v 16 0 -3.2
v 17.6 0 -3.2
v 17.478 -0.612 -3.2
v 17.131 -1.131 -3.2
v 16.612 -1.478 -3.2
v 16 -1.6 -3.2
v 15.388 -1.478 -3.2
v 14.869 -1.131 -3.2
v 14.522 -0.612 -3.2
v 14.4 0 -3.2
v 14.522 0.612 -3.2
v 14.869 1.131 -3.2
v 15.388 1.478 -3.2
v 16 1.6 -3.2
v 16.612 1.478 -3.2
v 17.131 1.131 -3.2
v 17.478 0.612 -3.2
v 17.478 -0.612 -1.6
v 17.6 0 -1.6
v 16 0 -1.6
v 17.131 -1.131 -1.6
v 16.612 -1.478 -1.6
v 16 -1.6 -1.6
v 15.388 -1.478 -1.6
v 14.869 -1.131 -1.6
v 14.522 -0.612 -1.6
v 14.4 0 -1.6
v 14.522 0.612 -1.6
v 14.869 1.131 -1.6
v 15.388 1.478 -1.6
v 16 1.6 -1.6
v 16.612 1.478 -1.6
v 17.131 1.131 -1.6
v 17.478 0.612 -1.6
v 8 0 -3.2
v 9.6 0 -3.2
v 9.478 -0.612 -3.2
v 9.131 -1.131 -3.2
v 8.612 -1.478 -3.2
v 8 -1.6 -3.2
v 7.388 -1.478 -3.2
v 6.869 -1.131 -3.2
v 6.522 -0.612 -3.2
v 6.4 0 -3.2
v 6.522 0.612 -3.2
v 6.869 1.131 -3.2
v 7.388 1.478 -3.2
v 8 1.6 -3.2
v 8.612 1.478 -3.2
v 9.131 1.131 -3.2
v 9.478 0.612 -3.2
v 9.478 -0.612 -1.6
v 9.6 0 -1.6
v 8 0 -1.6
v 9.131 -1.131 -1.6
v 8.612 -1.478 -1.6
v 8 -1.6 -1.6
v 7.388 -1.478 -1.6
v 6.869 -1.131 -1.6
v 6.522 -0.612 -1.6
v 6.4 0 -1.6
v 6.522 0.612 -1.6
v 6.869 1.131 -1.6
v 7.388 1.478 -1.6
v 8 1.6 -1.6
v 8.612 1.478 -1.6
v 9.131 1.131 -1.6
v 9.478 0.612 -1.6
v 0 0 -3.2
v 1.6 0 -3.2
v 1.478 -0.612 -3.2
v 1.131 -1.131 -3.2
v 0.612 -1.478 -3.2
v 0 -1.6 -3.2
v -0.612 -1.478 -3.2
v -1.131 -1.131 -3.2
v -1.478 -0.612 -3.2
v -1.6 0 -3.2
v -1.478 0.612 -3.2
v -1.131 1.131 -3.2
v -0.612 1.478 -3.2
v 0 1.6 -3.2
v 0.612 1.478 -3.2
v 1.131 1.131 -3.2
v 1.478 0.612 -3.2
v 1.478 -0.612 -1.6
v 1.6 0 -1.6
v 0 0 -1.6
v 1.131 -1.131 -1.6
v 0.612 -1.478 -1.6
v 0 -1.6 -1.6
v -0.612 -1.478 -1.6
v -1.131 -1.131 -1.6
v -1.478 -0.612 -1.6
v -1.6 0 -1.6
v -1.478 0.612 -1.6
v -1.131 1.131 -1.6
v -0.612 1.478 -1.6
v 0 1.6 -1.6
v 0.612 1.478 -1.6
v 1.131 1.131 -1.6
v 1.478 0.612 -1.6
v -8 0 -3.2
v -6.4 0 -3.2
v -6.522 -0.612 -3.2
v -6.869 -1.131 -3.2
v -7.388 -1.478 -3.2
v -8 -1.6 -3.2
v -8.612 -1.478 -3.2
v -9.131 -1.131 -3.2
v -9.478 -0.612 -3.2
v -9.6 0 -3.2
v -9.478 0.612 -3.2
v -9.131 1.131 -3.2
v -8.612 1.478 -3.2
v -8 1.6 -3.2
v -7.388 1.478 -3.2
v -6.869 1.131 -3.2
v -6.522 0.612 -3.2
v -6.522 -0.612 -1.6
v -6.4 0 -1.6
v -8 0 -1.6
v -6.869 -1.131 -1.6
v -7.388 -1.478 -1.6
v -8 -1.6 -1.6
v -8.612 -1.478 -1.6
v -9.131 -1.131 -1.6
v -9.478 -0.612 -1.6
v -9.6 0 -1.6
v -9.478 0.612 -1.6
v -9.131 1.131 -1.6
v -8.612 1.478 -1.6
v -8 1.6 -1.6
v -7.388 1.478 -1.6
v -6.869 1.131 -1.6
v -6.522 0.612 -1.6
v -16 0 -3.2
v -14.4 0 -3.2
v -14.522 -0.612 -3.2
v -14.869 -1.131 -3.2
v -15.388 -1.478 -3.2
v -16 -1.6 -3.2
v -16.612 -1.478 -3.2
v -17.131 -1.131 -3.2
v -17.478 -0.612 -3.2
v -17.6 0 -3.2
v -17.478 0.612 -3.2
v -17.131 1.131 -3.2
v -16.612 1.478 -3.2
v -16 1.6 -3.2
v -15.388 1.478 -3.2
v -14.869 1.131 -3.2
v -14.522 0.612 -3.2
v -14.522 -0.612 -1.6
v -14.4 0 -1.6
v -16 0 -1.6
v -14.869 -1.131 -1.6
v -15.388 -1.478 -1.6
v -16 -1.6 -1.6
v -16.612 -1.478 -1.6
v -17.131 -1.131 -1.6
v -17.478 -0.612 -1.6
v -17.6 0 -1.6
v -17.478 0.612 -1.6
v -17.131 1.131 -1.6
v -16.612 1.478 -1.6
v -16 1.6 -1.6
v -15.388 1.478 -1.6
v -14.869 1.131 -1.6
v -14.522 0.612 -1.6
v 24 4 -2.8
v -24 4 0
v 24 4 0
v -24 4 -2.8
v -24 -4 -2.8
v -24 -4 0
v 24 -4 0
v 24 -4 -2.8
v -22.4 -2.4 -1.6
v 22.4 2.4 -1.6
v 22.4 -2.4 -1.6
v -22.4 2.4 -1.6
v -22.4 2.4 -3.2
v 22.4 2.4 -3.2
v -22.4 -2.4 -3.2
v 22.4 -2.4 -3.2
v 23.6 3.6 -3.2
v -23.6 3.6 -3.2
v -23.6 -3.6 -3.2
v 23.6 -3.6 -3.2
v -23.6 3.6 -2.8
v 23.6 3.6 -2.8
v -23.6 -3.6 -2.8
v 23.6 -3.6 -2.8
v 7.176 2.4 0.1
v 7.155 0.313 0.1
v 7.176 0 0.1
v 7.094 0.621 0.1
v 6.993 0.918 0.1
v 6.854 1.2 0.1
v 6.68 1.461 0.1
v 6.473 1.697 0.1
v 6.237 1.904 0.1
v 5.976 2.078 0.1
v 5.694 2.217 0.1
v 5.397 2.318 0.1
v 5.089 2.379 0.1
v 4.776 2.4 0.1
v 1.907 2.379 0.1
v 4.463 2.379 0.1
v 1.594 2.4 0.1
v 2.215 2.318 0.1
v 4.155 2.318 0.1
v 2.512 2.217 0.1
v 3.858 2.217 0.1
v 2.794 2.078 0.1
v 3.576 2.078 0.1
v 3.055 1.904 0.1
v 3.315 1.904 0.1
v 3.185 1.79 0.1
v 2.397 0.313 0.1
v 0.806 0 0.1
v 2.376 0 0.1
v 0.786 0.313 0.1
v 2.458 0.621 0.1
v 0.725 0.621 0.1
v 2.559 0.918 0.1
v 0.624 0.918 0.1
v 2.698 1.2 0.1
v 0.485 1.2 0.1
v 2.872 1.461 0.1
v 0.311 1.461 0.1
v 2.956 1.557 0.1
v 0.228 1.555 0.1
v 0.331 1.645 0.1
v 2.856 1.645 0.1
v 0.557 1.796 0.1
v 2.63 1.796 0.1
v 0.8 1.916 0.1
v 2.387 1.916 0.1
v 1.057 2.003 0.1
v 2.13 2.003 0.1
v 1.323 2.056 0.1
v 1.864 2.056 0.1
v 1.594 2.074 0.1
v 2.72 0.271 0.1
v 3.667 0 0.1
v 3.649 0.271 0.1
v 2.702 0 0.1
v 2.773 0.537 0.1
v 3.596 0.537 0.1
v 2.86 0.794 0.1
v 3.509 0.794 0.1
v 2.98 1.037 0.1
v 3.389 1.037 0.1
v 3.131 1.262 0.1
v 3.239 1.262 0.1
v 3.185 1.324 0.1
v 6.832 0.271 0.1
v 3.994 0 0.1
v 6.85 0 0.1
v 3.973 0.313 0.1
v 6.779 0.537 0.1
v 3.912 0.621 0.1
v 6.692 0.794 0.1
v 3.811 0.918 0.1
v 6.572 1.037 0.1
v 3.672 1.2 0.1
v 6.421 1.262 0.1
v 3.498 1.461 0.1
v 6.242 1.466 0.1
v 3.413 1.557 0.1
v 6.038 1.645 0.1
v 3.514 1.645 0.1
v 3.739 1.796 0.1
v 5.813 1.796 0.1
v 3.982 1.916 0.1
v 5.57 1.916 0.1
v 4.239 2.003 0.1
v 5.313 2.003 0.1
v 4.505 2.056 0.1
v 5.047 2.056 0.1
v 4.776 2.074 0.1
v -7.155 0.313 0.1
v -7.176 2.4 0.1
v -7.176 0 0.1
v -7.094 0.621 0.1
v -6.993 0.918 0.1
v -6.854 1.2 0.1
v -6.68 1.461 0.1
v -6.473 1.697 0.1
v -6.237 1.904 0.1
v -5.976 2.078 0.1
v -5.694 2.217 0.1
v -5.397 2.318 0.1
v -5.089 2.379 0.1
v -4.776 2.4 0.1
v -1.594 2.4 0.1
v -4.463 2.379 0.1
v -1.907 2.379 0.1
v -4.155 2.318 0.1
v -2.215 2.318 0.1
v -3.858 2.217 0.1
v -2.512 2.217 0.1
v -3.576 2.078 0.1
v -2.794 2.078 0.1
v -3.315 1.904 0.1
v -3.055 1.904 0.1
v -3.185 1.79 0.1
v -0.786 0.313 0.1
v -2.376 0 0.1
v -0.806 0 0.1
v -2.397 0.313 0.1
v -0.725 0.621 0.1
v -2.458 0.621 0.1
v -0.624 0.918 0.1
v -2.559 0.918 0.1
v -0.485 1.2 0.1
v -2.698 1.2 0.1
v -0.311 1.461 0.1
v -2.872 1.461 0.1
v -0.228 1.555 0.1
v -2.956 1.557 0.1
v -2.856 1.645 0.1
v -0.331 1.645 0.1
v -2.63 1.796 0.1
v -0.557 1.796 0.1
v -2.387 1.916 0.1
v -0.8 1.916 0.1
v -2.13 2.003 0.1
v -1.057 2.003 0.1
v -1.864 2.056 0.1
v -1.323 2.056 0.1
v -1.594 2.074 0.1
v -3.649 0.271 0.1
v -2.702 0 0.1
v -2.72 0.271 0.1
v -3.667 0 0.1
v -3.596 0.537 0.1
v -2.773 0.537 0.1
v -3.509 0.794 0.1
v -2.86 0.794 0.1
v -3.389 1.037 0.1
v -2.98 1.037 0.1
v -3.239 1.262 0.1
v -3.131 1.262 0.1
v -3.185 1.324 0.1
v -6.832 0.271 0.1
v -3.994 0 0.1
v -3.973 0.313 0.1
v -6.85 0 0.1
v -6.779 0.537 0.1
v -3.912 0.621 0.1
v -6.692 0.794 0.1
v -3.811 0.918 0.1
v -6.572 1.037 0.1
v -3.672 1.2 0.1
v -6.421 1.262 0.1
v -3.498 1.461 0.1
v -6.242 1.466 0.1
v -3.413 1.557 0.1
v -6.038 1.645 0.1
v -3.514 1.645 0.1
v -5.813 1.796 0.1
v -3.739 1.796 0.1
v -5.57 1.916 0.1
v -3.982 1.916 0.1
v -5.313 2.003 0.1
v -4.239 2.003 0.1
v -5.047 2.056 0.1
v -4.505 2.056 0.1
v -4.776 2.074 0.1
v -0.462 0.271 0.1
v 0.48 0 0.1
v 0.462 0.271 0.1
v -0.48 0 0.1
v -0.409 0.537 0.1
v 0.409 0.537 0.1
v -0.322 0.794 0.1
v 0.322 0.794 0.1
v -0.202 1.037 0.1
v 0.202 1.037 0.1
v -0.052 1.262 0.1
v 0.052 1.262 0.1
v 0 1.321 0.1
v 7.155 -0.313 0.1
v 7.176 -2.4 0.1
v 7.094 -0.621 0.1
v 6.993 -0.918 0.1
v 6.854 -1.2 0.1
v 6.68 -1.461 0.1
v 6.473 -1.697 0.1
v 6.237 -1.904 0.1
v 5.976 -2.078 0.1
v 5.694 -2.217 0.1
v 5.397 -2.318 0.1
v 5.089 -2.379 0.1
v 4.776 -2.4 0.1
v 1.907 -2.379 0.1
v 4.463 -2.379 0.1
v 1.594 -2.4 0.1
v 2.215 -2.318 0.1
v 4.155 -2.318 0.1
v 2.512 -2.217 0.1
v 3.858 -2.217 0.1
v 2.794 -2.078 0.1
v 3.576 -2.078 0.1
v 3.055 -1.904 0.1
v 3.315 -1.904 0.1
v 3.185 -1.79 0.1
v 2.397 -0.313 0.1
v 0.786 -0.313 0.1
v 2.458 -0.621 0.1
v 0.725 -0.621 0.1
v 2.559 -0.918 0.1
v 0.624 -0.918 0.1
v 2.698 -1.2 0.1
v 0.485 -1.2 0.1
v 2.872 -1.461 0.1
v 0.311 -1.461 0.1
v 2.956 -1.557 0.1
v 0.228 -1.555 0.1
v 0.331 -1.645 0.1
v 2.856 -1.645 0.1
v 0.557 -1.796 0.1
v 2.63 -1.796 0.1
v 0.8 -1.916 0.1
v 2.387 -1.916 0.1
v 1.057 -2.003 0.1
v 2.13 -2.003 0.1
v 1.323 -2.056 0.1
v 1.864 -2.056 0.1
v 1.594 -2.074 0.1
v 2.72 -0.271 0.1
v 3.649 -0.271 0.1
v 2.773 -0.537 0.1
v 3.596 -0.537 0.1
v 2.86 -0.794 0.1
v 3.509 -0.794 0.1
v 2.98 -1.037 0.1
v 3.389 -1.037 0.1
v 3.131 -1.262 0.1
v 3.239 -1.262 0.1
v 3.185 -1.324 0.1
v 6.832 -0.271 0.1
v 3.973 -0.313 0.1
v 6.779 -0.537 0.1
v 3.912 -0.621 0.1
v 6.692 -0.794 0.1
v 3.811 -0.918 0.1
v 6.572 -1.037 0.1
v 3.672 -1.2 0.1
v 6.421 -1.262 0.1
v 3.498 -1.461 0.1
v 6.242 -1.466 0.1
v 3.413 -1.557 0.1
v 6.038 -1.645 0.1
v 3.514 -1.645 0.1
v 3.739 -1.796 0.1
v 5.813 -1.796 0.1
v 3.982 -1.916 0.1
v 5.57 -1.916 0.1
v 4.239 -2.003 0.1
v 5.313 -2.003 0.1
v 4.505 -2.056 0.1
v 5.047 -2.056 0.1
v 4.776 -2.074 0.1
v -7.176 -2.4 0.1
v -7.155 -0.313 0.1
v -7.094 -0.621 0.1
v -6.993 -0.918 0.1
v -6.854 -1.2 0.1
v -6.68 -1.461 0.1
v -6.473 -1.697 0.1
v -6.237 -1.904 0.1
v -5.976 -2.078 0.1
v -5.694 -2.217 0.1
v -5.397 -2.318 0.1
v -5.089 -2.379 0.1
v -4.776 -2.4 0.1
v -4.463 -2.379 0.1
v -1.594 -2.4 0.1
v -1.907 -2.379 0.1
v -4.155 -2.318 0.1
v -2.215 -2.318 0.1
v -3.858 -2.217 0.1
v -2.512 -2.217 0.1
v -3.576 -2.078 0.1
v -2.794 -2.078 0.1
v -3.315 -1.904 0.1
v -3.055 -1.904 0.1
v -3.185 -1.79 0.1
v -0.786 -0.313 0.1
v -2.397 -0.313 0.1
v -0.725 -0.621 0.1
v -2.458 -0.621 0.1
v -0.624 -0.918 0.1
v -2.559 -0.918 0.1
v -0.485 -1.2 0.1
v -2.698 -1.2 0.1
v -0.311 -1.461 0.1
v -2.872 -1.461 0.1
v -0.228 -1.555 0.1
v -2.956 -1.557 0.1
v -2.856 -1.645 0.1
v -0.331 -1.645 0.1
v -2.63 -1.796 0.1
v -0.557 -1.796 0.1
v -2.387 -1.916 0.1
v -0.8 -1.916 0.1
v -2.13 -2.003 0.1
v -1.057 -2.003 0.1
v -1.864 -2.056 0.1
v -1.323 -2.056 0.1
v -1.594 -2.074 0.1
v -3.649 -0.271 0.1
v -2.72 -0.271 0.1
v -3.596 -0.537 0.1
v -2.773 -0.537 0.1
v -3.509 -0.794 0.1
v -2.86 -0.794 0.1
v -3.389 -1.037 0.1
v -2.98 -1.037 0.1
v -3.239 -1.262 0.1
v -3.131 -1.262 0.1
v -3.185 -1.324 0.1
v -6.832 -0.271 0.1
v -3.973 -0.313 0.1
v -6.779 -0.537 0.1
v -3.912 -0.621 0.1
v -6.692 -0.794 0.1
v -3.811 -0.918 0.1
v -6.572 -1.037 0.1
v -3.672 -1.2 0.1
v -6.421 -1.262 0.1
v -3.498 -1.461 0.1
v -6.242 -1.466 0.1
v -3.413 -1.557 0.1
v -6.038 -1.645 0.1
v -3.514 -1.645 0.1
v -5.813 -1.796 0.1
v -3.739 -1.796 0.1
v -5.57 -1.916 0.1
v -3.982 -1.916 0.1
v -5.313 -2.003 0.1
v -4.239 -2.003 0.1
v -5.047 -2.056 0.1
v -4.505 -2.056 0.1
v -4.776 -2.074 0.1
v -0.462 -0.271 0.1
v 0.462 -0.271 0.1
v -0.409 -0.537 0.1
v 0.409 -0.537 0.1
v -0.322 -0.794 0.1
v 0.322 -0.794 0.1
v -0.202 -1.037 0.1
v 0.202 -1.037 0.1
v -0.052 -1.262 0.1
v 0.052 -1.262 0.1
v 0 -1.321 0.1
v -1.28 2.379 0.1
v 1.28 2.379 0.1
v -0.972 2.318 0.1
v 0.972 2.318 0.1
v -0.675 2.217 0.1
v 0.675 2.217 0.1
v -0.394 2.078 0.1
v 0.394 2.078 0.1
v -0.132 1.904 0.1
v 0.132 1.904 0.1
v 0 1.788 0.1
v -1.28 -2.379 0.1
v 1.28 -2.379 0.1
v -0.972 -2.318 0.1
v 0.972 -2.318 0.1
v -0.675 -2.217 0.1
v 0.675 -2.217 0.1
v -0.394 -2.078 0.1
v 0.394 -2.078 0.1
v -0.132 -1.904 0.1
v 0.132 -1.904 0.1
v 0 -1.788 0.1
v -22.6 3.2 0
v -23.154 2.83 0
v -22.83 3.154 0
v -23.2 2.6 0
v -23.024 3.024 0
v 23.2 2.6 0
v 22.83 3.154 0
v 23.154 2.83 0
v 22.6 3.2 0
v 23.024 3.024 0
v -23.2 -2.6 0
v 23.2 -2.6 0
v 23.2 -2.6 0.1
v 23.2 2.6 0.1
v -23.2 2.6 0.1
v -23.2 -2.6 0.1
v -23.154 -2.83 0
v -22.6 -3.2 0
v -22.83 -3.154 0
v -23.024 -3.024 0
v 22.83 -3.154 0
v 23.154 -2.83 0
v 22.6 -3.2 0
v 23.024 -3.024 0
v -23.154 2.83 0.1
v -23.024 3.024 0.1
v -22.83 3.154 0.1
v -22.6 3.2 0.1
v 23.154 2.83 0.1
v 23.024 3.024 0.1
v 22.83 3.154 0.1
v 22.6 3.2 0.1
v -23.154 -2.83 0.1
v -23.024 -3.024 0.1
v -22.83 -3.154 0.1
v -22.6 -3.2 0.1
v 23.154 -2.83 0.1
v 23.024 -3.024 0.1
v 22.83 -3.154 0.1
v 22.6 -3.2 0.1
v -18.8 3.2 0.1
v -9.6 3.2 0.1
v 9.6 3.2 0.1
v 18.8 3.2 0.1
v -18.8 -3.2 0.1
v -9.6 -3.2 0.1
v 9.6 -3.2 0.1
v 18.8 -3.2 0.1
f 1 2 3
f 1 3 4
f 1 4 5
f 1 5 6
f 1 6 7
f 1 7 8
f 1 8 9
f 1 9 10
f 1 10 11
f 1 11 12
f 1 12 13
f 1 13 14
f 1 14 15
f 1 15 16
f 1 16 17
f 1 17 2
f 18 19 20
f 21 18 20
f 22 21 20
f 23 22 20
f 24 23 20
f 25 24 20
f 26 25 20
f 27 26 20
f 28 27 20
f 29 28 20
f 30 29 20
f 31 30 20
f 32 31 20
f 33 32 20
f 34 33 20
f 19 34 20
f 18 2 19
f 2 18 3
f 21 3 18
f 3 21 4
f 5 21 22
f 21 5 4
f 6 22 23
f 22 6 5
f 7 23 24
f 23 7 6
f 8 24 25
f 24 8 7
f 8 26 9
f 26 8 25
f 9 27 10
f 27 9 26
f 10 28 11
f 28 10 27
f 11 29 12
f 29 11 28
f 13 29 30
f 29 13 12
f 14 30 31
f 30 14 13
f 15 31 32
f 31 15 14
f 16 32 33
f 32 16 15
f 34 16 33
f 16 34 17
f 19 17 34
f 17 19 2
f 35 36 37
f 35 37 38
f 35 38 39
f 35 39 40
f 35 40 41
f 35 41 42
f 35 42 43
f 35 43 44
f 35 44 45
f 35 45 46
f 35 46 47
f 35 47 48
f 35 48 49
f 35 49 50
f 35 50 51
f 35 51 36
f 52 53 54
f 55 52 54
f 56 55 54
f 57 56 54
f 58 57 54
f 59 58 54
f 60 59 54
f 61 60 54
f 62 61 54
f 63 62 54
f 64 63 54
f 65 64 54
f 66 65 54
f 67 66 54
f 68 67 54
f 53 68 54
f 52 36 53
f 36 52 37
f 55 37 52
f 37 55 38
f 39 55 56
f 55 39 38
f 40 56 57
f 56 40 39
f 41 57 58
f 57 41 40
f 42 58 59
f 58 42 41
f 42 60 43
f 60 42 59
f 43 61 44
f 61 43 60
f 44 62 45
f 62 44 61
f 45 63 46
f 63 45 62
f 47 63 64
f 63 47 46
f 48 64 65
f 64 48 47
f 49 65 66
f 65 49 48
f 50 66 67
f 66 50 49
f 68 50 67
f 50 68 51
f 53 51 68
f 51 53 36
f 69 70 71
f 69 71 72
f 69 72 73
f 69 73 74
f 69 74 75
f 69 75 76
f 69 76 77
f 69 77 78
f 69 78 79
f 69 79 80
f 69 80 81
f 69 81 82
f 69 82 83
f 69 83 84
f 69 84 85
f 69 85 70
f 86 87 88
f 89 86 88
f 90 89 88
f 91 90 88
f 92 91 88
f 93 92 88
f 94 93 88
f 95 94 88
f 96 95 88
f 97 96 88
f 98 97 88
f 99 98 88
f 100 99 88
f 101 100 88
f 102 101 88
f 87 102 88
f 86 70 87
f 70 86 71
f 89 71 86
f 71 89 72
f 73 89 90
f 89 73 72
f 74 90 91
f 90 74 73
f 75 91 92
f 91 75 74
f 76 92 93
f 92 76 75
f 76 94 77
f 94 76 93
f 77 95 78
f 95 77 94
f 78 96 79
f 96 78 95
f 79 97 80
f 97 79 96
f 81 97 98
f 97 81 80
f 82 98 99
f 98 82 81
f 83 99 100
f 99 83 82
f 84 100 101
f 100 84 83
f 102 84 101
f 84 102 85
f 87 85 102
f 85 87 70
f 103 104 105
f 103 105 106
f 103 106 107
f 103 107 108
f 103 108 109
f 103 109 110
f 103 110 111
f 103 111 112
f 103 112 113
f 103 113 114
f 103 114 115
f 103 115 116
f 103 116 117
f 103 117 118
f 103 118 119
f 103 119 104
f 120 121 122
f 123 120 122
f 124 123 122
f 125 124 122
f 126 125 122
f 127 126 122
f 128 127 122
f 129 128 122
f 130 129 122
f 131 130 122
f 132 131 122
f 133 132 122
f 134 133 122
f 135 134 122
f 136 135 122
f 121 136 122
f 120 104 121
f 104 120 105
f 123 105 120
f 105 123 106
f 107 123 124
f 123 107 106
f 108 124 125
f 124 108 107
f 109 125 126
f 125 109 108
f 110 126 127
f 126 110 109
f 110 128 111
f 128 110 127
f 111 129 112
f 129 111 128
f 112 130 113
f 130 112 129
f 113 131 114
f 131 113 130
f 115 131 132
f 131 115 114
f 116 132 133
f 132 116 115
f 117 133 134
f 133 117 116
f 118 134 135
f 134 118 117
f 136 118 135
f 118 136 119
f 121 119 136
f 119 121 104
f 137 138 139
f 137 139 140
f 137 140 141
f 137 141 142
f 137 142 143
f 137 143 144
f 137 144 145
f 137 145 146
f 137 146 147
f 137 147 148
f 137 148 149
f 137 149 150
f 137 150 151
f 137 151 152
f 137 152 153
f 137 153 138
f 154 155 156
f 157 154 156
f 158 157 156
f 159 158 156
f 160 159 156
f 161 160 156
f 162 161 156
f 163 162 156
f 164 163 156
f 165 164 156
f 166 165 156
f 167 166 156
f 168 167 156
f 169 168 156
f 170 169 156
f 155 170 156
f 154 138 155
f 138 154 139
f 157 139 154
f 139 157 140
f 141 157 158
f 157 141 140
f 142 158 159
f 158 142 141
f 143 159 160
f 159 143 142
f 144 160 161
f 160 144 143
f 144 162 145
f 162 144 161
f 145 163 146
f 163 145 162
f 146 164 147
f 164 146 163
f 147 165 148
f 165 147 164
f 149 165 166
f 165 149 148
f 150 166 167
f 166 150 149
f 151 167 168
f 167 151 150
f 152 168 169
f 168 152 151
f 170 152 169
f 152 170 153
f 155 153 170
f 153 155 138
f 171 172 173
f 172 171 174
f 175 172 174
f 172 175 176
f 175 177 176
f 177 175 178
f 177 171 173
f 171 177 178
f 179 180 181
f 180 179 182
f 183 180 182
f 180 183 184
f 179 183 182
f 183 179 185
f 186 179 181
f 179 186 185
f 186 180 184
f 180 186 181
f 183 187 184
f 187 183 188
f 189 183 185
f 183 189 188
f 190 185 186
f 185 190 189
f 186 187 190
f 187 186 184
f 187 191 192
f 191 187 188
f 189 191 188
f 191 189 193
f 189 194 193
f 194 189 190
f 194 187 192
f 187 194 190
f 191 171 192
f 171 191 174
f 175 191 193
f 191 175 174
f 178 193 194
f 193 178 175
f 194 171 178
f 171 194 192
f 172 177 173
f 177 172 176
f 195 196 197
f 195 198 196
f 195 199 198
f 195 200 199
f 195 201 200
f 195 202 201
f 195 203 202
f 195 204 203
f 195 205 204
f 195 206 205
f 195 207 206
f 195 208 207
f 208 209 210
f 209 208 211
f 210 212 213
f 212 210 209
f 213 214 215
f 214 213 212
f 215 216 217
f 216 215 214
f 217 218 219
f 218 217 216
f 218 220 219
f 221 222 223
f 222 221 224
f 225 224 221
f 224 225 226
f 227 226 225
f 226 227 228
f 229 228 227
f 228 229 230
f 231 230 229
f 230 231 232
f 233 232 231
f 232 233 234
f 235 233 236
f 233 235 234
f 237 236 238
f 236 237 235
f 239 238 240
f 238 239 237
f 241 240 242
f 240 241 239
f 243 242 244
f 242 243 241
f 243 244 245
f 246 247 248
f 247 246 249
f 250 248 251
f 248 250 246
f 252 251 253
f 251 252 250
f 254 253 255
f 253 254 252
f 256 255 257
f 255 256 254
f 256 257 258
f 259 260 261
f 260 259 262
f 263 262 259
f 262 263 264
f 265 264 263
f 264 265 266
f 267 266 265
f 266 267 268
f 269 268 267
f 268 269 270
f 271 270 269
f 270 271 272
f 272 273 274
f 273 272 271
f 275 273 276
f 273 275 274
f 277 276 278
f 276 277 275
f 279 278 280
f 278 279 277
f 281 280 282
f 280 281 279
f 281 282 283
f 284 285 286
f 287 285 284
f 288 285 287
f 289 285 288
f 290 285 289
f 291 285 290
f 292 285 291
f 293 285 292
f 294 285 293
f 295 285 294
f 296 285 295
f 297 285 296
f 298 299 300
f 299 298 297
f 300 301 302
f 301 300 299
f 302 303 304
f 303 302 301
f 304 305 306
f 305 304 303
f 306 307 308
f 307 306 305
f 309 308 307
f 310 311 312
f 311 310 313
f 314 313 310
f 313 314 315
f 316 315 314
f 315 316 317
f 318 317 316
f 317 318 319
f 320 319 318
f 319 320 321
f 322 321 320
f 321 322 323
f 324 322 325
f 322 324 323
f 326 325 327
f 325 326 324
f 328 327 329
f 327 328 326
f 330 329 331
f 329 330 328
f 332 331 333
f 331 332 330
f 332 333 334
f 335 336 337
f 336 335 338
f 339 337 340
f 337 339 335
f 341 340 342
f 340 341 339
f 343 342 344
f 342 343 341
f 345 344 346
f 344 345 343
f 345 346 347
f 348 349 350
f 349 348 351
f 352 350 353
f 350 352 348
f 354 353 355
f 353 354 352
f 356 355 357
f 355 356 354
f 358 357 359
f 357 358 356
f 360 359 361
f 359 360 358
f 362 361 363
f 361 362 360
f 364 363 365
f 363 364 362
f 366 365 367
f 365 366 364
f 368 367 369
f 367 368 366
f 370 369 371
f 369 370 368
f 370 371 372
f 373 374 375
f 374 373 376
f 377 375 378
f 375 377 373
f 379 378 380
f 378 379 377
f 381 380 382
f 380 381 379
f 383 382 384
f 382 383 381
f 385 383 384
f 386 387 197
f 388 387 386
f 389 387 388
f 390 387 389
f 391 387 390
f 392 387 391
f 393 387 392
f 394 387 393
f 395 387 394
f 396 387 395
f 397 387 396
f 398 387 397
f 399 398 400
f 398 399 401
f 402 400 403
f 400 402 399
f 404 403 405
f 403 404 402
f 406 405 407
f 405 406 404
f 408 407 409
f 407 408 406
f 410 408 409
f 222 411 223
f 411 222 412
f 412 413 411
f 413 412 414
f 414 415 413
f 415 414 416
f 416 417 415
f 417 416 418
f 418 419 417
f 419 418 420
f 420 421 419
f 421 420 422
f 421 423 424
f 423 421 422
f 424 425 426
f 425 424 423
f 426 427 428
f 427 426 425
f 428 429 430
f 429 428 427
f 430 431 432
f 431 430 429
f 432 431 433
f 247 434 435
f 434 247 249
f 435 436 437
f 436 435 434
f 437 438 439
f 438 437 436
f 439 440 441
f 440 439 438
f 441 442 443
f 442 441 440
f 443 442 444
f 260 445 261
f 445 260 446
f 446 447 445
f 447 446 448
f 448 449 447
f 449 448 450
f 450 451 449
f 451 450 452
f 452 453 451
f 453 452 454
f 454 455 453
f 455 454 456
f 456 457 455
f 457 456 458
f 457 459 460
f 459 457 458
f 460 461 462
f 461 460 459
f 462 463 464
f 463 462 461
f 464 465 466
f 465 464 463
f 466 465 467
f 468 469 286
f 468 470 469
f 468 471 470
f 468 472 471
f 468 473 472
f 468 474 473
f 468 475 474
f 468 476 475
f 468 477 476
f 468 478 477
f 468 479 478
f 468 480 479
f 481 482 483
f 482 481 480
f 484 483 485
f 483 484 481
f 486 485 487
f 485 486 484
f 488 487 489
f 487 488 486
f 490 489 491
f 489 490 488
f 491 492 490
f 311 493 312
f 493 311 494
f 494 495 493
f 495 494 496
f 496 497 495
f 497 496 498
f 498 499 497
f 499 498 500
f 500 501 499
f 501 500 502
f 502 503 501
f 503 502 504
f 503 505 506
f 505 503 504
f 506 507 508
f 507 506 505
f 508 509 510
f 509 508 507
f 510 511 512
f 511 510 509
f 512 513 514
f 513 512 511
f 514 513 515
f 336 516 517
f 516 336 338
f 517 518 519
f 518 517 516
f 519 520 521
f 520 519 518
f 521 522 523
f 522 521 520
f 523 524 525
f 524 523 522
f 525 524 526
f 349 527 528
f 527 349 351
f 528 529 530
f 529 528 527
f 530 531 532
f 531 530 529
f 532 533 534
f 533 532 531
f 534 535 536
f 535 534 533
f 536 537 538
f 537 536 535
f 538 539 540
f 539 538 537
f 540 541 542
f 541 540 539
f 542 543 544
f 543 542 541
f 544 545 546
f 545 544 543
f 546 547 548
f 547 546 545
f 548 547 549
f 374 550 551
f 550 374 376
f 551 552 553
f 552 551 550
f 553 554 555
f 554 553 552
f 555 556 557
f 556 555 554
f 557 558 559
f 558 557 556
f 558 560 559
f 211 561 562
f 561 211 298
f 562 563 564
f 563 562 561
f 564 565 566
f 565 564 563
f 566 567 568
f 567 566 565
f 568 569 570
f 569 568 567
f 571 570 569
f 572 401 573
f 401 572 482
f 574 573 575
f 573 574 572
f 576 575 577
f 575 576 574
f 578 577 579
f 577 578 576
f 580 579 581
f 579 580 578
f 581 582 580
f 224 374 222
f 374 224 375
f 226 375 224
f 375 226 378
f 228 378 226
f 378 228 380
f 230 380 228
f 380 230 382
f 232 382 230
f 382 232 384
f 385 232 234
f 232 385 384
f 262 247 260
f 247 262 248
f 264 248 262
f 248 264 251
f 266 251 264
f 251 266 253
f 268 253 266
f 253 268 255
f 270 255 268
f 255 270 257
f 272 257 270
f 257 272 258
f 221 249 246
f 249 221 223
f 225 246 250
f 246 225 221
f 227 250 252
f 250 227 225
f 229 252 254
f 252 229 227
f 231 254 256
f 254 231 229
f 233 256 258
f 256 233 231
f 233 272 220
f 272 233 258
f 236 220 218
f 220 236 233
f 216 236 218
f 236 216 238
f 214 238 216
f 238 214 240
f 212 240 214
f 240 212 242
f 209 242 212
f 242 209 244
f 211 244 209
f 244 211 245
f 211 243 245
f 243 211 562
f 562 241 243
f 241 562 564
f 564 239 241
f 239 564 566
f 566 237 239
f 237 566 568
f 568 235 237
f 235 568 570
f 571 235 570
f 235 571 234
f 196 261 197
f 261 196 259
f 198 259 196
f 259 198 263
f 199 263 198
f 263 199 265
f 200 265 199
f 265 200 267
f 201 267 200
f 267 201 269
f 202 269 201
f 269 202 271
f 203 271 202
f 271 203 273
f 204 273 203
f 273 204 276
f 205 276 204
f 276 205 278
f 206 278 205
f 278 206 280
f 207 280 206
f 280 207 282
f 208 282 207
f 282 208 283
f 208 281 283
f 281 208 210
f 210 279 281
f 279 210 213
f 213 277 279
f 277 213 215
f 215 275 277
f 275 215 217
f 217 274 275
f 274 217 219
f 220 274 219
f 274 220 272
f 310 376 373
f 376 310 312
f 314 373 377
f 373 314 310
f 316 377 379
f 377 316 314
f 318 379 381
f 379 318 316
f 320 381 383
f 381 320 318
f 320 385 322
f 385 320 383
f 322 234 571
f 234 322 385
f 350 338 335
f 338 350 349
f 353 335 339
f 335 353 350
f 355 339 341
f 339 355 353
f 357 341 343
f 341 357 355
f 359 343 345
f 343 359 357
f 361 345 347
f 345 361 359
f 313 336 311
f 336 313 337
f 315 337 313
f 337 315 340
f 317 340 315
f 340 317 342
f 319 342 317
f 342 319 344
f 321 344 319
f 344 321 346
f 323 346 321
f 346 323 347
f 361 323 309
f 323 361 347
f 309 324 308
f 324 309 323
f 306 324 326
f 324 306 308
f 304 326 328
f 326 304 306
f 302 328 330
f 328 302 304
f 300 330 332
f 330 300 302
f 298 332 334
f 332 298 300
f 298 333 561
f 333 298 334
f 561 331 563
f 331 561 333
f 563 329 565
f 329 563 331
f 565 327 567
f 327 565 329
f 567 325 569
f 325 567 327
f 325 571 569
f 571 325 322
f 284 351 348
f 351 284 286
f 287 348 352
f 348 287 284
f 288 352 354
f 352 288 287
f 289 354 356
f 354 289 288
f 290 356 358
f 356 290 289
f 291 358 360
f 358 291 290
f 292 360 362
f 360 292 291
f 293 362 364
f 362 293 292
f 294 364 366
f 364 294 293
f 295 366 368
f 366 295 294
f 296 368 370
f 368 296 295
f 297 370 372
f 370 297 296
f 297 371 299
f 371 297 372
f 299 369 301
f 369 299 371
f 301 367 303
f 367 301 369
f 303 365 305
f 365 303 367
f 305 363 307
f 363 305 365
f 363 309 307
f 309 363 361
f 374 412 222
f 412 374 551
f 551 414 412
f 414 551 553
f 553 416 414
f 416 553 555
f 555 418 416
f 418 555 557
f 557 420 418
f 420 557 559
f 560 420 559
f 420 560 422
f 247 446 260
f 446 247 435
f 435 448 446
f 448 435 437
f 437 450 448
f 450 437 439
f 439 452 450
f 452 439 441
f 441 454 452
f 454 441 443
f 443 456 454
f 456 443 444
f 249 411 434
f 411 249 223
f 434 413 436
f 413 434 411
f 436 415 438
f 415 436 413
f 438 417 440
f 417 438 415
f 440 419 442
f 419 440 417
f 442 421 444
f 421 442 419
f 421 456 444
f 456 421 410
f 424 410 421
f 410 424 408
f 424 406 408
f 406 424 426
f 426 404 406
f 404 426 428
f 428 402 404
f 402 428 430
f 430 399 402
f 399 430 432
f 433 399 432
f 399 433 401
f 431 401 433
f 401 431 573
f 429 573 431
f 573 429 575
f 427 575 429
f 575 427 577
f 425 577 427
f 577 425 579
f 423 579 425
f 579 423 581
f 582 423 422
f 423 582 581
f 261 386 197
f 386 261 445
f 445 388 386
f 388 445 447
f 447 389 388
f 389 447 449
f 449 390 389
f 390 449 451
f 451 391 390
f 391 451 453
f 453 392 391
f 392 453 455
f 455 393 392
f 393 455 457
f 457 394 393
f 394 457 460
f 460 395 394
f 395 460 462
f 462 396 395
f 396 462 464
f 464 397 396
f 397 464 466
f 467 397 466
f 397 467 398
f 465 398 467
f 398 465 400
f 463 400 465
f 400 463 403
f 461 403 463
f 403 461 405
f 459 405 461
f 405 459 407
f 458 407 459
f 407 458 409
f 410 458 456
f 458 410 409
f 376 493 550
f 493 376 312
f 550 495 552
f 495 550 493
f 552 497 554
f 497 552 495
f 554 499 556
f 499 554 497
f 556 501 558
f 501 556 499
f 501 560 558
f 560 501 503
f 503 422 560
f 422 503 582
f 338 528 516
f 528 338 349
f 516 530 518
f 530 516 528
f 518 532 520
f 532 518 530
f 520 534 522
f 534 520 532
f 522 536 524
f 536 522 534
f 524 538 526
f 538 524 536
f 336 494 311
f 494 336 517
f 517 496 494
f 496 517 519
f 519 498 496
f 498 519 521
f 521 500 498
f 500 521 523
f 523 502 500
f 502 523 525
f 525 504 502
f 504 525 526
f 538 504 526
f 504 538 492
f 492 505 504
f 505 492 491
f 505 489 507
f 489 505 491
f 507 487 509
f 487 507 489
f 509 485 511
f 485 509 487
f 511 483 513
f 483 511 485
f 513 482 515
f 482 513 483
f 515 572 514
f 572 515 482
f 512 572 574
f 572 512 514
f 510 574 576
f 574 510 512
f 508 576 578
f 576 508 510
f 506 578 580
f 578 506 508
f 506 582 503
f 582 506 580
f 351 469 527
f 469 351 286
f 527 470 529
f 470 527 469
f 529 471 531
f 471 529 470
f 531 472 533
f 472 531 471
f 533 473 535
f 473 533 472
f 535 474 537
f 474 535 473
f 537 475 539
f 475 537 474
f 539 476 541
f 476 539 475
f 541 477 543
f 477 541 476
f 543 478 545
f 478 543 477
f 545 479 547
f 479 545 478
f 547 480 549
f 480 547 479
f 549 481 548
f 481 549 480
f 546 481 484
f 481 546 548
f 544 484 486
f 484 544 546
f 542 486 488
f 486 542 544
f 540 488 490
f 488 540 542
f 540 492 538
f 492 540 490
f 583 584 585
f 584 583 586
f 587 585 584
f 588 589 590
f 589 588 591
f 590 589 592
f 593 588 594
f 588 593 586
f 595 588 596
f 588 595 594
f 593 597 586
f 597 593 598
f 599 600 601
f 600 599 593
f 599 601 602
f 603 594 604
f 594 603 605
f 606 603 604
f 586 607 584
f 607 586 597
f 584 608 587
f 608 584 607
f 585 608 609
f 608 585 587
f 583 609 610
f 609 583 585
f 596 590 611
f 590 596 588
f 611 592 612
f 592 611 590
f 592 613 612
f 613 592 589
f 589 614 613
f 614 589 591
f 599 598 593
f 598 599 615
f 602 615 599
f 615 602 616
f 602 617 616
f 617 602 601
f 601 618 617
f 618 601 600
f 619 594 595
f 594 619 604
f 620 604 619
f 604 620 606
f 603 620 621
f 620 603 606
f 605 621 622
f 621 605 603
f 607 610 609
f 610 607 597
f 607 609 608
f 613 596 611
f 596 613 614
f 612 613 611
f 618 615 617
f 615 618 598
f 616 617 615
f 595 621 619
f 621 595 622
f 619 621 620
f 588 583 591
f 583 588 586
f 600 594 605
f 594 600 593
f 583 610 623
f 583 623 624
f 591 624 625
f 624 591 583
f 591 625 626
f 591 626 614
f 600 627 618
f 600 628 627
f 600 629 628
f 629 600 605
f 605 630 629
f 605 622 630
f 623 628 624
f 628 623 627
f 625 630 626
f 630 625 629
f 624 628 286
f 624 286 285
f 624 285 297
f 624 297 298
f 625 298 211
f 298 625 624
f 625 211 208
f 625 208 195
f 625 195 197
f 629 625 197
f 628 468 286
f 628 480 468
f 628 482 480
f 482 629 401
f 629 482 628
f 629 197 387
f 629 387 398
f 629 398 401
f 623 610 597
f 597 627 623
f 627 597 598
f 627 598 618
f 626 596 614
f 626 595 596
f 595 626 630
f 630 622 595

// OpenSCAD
use <../lib.scad>
use <6142275a.scad>
use <6636.scad>
function ldraw_lib__6636d0b() = [
// 0 Tile  1 x  6 with Black and White Stripes and White Audi Logo on Red Background Sticker
// 0 Name: 6636d0b.dat
// 0 Author: Vincent Messenet [Cheenzo]
// 0 !LDRAW_ORG Shortcut UPDATE 2026-05
// 0 !LICENSE Licensed under CC BY 4.0 : see CAreadme.txt
// 
// 0 BFC CERTIFY CCW
  [0,"BFC","CERTIFY"],
  [0,"BFC","CCW"],
// 
// 0 !CATEGORY Sticker Shortcut
// 
// 0 !KEYWORDS Bricklink 6636pb239, Set 75872
// 
// 0 !HISTORY 2026-05-31 [OrionP] Official Update 2026-05
// 
// 1 16 0 0 0 1 0 0 0 1 0 0 0 1 6636.dat
  [1,16,0,0,0,1,0,0,0,1,0,0,0,1, ldraw_lib__6636()],
// 1 16 0 0 0 1 0 0 0 1 0 0 0 1 6142275a.dat
  [1,16,0,0,0,1,0,0,0,1,0,0,0,1, ldraw_lib__6142275a()],
];
module ldraw_lib__6636d0b(step=0, col=false, unit=2/5, alt=false, line=0.2, solid=!$preview)
    makepoly(ldraw_lib__6636d0b(), step=step, col=col, unit=unit, alt=alt, line=line, solid=solid);
ldraw_lib__6636d0b(line=0.2);
